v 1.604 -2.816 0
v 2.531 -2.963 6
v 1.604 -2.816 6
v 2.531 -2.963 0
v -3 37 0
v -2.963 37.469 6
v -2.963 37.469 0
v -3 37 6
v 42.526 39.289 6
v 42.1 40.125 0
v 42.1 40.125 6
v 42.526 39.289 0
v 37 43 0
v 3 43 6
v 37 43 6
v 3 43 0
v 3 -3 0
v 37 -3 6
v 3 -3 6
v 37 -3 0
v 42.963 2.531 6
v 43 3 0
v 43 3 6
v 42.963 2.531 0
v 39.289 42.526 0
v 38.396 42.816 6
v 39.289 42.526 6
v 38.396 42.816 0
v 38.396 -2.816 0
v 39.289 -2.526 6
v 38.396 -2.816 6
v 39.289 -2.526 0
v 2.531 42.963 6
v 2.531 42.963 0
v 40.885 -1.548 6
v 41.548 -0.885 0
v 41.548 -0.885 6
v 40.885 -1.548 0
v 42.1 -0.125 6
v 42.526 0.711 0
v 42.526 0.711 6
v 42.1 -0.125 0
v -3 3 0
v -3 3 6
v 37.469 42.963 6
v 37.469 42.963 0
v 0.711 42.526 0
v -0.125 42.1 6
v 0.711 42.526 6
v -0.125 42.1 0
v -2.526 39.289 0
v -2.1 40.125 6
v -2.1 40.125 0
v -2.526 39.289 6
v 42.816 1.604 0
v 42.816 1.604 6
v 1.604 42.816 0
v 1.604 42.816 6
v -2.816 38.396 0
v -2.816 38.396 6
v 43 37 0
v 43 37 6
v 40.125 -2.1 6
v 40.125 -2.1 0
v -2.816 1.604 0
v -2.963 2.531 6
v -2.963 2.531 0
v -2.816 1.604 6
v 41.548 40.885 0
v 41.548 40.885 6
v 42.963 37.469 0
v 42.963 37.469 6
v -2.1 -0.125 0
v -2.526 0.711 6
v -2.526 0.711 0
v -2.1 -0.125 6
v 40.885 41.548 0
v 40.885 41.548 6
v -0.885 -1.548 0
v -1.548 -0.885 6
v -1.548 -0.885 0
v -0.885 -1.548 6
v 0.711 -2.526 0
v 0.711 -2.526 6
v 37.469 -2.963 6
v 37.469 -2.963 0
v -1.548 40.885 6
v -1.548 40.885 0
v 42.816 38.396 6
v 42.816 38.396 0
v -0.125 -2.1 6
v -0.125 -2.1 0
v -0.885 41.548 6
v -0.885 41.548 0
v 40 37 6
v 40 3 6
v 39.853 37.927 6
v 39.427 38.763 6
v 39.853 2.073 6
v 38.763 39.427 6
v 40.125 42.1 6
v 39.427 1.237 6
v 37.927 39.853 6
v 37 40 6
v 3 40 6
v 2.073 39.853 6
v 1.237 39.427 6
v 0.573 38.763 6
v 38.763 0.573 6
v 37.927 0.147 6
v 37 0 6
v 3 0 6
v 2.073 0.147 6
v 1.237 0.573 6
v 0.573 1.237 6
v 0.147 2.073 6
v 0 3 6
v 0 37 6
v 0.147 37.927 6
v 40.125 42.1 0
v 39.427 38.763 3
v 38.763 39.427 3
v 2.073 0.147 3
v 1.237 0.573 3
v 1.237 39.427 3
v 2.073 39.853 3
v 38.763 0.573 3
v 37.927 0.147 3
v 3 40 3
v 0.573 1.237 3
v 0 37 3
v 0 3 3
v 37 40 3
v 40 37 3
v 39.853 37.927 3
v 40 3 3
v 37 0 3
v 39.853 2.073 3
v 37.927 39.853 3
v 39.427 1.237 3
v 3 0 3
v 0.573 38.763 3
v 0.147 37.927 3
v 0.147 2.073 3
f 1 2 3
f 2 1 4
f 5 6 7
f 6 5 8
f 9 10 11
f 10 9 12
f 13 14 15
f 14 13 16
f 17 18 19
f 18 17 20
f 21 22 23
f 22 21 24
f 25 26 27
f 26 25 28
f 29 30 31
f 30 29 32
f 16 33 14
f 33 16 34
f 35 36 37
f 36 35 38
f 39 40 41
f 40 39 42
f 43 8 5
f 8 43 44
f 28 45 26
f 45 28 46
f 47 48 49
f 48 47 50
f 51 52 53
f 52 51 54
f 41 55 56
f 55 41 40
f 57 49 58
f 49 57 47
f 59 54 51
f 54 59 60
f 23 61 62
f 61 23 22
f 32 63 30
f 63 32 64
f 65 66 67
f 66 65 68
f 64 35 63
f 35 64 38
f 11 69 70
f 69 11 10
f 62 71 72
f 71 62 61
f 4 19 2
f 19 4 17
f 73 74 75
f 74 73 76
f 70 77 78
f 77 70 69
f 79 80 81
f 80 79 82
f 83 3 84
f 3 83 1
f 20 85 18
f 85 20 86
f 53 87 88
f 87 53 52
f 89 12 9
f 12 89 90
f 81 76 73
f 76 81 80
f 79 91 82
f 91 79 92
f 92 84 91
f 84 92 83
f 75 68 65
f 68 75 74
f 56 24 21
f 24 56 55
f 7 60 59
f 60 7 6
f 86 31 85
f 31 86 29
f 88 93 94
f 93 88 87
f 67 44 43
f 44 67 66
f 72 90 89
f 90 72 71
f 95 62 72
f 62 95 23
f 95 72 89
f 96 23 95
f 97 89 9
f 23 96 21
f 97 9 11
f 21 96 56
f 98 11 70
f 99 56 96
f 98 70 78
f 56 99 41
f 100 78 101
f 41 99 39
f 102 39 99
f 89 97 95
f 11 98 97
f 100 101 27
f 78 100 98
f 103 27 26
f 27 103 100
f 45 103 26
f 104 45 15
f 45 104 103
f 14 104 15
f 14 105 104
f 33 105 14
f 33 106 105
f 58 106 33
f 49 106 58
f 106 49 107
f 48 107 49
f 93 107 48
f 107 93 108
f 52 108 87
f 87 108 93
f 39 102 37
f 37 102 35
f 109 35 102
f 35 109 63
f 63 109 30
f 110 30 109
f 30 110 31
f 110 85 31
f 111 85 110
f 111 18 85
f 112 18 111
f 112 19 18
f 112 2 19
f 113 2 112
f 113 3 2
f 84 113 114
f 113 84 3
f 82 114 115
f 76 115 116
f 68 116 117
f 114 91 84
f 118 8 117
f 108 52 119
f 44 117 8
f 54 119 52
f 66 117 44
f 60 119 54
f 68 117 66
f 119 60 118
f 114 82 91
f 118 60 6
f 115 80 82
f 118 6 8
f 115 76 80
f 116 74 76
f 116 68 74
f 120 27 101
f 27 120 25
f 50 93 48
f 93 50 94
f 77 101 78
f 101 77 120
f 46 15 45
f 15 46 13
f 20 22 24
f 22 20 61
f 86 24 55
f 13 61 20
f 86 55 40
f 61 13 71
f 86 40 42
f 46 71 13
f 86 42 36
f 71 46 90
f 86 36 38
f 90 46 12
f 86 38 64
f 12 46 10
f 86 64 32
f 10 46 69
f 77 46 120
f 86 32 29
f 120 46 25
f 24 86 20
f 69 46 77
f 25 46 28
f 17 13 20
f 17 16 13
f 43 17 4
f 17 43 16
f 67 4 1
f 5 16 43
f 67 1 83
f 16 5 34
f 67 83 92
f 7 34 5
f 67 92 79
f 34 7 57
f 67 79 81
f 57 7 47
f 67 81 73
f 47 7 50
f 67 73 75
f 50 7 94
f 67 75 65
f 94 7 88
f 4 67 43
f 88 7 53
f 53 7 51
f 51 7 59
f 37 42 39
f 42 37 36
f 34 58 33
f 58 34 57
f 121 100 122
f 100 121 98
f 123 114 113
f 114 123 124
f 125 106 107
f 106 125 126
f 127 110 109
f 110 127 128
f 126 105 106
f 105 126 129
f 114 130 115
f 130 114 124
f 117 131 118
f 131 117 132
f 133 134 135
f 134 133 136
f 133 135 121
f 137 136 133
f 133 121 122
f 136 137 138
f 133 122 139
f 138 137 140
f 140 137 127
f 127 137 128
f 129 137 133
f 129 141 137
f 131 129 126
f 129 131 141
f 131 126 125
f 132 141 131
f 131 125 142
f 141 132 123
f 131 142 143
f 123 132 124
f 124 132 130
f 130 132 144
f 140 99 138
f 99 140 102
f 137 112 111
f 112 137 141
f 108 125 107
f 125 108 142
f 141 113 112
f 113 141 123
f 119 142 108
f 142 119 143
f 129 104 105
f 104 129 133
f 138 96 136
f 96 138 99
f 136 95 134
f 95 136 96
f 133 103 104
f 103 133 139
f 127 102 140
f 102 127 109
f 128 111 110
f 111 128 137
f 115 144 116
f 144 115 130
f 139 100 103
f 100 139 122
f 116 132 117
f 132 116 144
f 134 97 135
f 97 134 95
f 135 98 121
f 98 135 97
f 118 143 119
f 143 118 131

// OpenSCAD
// file: ../lib/utils.scad
module cone(r, angle, invert=false) {
    h = tan((180 - angle) / 2) * r;
    translate([0, 0, -h]) {
        if (invert) {
                cylinder(r1=r,r2=0,h=h, $fn=20); 
        } else {
            cylinder(r1=0,r2=r,h=h, $fn=20); 
        }
    }
}

module roundrect(vect, r, $fn=20) {
    sq = len(vect) > 1
        ? [for (i = [0:1:len(vect)-1]) vect[i] - r * 2]
        : vect - r * 2;
    minkowski() {
        square(sq);
        translate([r, r])
            circle(r=r);
    }
}

module screw(r, d, l, head, head_d, cap, angle, $fn=20) {
    radius = r > 0 ? r : d / 2;
    head_r = head > 0 ? head : head_d / 2;

    union() {
        if (angle) {
            translate([0, 0, l])
                cone(head_r, angle, false);
        }
        linear_extrude(l)
            circle(r=radius);
        if (cap > 0) {
            translate([0, 0, l - cap])
                linear_extrude(cap)
                    circle(r=head_r);
        }
    }
}

module inset_screw(r, d, l, head, head_d, cap, angle, inset, $fn=20) {
    screw_height = l - inset;
    head_r = head > 0 ? head : head_d / 2;

    union() {
        screw(
            r=r,
            d=d,
            l=screw_height,
            head=head_r,
            cap=cap,
            angle=angle,
            $fn=$fn
        );
        translate([0, 0, screw_height])
            linear_extrude(inset)
                circle(r=head_r);
    }
}

function inch_to_mm(inches) = inches * 25.4;
function increase(vec, amt) = [for (i = vec) i + amt];
// main file
// Angled Foot Riser
// by Nathan Wittstock <nate@fardog.io>

// preview[view: south east, tilt: top diagonal]

use <../lib/utils.scad>;

width = 40;
depth = 40;
height = 3;
radius = 3;

// foot inset
foot_offset = 3;
foot_inset = 3;

x_skew = 0;
y_skew = 0;

difference() {
    hull() {
        linear_extrude(height + foot_inset)
            offset(r=foot_offset)
                roundrect([width, depth], radius);
        rotate([x_skew, y_skew, 0])
            linear_extrude(0.1)
            roundrect([width, depth], radius);
    }
    // foot cut
    translate([0, 0, height])
        linear_extrude(foot_inset)
            roundrect([width, depth], radius);
}
